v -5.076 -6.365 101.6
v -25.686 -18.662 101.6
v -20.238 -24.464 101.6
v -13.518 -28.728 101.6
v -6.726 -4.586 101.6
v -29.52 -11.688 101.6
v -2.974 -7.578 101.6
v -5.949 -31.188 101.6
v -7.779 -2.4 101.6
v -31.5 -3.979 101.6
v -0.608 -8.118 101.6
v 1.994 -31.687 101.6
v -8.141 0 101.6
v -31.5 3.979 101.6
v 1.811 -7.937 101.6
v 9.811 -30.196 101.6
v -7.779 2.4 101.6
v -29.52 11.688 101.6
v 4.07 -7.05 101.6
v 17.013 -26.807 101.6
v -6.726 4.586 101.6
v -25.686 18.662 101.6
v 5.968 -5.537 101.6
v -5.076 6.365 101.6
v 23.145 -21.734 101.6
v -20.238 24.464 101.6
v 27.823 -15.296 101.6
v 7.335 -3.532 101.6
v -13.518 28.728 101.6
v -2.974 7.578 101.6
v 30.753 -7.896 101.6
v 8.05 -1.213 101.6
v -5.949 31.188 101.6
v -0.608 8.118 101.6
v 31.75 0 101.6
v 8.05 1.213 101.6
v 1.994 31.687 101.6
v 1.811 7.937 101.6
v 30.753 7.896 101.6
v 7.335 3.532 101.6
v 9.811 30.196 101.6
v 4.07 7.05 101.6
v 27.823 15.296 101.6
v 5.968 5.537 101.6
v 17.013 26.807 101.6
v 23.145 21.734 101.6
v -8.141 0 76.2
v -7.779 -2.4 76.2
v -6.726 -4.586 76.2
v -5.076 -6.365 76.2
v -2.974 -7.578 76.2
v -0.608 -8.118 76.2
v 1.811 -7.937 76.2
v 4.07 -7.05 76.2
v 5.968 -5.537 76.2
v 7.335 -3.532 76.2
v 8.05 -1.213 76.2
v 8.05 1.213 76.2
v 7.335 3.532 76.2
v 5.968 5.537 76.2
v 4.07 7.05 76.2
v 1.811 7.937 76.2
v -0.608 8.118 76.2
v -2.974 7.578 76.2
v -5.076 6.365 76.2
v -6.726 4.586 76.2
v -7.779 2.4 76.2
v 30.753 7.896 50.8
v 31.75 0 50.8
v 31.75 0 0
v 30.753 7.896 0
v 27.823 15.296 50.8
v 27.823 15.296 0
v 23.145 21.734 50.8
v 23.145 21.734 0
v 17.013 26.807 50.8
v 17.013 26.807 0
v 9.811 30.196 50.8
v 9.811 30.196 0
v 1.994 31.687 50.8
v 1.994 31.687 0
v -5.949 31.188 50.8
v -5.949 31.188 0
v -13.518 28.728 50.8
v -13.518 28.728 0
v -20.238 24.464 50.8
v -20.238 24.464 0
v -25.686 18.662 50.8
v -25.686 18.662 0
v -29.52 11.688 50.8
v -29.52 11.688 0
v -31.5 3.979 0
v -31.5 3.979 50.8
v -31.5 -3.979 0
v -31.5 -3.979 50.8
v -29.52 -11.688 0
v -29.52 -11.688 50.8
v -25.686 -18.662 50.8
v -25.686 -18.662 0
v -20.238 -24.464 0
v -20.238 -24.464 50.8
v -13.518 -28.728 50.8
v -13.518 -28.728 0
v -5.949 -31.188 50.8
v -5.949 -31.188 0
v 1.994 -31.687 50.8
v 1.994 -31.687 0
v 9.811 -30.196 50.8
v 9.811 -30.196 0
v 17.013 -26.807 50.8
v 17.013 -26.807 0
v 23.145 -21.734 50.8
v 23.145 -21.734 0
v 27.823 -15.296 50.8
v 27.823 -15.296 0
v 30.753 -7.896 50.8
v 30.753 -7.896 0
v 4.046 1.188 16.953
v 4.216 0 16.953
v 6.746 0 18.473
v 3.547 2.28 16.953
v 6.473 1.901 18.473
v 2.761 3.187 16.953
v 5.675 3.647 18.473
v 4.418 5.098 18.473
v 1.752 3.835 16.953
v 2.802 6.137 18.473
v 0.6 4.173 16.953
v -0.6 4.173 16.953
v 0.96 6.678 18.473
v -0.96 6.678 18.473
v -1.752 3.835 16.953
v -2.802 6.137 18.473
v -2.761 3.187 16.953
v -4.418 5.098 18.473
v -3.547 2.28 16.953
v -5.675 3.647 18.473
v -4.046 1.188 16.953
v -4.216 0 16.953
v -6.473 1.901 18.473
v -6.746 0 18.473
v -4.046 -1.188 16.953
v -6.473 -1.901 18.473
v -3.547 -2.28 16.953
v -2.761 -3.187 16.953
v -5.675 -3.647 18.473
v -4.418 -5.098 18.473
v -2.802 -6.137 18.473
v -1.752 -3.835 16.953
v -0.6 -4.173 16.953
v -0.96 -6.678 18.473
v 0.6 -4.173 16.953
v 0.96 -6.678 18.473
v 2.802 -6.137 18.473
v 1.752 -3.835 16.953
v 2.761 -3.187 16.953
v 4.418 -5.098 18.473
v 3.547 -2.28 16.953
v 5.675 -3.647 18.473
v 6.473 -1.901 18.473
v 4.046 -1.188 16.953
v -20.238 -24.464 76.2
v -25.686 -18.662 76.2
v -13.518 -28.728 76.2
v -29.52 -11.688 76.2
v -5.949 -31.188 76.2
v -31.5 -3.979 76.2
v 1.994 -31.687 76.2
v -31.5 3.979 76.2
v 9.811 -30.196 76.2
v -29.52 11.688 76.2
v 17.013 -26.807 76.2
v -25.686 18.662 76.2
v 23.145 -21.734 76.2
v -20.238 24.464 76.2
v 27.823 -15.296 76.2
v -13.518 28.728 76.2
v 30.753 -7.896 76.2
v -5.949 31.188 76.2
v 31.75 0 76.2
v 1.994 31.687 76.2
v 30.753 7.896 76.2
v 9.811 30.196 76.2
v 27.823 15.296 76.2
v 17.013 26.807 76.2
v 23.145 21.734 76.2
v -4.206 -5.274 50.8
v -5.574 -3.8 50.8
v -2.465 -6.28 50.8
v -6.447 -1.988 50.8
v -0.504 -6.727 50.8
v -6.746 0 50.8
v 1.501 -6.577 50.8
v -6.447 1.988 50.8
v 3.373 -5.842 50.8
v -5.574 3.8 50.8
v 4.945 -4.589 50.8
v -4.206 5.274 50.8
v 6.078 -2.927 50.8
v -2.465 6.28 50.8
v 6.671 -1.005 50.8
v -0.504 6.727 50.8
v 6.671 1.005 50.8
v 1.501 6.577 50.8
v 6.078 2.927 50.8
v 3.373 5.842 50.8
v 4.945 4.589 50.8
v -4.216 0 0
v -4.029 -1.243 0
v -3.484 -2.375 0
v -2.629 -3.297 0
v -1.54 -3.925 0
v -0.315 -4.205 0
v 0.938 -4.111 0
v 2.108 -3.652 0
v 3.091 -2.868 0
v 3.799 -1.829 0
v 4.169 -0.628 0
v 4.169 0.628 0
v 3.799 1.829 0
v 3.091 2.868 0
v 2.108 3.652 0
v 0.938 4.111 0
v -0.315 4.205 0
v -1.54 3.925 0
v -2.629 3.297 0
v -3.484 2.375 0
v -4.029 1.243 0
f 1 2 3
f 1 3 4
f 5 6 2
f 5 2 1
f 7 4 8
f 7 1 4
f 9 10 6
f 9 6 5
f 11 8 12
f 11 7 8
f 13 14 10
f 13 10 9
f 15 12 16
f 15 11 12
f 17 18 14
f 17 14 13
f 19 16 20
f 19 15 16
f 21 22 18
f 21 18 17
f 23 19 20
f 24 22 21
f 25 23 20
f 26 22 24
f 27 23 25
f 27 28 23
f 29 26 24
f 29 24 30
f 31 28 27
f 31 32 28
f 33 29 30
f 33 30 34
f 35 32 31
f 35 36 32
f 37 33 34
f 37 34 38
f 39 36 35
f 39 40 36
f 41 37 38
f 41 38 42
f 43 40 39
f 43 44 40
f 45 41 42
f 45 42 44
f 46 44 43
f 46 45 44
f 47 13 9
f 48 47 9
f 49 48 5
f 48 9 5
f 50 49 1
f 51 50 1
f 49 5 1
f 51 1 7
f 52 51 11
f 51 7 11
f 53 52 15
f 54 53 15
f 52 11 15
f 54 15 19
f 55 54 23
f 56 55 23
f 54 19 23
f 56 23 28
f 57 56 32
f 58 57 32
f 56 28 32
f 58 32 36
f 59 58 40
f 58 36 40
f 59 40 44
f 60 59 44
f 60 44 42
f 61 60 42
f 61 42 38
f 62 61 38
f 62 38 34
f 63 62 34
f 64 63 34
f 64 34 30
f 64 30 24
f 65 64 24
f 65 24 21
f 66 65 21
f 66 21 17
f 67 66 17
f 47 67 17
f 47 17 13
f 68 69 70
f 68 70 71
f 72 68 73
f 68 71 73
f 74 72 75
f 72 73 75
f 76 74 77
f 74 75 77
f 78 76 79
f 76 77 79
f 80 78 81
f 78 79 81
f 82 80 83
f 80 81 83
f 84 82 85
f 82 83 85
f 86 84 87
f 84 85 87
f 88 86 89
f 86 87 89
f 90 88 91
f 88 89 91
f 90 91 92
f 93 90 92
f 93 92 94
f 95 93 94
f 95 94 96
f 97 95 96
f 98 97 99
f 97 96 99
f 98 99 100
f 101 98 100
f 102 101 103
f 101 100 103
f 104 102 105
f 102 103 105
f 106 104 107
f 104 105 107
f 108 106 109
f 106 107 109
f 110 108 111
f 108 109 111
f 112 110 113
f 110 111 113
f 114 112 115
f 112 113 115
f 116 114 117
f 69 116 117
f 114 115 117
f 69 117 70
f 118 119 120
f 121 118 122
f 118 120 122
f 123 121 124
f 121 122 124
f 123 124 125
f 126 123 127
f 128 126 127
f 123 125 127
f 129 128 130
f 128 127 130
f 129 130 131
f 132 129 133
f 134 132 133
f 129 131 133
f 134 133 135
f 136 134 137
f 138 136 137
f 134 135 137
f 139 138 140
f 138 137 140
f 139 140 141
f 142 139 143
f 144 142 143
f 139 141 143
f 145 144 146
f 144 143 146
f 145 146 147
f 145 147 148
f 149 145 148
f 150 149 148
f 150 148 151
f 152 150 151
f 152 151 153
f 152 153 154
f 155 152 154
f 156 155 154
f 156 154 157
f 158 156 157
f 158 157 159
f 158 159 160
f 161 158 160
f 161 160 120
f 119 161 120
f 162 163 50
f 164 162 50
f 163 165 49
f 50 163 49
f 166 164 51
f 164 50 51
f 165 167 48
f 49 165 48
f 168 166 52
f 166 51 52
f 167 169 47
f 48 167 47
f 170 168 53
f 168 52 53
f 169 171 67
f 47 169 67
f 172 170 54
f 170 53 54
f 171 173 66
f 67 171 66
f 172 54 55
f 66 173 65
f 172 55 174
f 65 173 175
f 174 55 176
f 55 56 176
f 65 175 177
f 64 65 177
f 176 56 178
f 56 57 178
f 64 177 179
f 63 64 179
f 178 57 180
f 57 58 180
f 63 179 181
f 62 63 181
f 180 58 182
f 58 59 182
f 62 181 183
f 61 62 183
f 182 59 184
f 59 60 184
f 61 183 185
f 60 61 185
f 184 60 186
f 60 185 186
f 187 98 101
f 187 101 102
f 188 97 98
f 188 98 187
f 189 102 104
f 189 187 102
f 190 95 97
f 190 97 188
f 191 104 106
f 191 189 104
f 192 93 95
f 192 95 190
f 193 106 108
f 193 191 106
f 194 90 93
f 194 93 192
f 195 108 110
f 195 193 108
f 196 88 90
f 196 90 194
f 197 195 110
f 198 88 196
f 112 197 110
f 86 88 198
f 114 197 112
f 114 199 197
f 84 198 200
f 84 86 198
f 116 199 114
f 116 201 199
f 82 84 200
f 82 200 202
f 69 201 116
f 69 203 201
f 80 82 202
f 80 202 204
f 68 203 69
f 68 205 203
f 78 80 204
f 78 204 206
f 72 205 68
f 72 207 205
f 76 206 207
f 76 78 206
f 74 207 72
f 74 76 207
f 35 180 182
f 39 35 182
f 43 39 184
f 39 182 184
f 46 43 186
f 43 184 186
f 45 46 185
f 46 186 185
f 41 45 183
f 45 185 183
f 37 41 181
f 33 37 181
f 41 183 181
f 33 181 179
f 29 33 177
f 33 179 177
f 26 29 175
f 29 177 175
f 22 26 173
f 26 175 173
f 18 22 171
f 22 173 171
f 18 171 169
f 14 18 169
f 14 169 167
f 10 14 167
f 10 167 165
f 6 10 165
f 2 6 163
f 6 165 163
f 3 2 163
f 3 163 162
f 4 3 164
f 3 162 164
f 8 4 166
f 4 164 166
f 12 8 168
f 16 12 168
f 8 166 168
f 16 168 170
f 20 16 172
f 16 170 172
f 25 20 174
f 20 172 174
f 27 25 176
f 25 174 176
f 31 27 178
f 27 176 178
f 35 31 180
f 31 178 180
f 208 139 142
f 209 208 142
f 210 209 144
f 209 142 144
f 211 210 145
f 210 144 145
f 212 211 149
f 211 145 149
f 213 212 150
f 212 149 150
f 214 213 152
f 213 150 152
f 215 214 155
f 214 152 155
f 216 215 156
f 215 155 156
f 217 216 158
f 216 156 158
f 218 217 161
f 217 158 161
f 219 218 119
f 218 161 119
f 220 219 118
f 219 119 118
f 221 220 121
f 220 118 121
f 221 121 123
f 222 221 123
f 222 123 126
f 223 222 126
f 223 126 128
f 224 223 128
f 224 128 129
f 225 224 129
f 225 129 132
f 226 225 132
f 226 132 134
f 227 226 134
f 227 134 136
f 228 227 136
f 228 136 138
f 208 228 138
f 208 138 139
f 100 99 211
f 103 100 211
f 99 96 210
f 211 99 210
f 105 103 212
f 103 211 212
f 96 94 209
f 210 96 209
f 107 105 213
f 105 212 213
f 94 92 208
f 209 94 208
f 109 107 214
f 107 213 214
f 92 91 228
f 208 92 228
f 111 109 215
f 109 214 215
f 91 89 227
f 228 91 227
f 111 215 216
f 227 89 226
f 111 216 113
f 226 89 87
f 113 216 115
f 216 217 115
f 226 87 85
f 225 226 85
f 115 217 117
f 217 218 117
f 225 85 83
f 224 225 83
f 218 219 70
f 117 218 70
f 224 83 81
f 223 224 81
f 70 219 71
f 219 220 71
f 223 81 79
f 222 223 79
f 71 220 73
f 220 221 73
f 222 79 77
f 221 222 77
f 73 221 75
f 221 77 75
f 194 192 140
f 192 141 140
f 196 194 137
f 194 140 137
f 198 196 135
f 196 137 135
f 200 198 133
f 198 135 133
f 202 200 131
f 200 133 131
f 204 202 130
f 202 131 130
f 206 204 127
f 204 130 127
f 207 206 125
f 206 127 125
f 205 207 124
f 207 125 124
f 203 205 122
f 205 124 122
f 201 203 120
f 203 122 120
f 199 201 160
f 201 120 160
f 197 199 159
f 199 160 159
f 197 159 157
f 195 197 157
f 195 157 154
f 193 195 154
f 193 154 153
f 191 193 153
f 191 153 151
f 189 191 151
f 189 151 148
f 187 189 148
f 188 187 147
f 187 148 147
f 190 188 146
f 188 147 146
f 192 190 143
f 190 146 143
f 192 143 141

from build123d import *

# Parameters (mm, degrees)
F0_R     = 31.75
F1_DEPTH = 50.8
F2_D     = 8.4328
F4_D     = 13.49248
F4_DEPTH = 32.3272727273
F4_TIP   = 4.0535499425
F6_R     = 31.75
F7_DEPTH = 25.4
F8_D     = 16.2814


with BuildPart() as f1:
    # F0 (on Top) → F1 (new body)
    with BuildSketch(Plane.XY):
        Circle(F0_R)
    extrude(amount=F1_DEPTH)

    # F2 (through all)
    with Locations(Plane(origin=(0, 0, 0), x_dir=(1, 0, 0), z_dir=(0, 0, -1))):
        with Locations((0, 0)):
            Hole(F2_D / 2)

    # F4
    with Locations(Plane.XY.offset(50.8)):
        with Locations((0, 0)):
            Hole(F4_D / 2, depth=F4_DEPTH)
            with Locations((0, 0, -(F4_DEPTH + F4_TIP / 2))):  # 118° drill point
                Cone(0, F4_D / 2, F4_TIP, mode=Mode.SUBTRACT)


with BuildPart() as f7:
    # F6 (on offset) → F7 (new body)
    with BuildSketch(Plane.XY.offset(76.2)):
        Circle(F6_R)
    extrude(amount=F7_DEPTH)

    # F8 (through all)
    with Locations(Plane(origin=(0, 0, 76.2), x_dir=(1, 0, 0), z_dir=(0, 0, -1))):
        with Locations((0, 0)):
            Hole(F8_D / 2)


solid = Compound([f1.part, f7.part])
